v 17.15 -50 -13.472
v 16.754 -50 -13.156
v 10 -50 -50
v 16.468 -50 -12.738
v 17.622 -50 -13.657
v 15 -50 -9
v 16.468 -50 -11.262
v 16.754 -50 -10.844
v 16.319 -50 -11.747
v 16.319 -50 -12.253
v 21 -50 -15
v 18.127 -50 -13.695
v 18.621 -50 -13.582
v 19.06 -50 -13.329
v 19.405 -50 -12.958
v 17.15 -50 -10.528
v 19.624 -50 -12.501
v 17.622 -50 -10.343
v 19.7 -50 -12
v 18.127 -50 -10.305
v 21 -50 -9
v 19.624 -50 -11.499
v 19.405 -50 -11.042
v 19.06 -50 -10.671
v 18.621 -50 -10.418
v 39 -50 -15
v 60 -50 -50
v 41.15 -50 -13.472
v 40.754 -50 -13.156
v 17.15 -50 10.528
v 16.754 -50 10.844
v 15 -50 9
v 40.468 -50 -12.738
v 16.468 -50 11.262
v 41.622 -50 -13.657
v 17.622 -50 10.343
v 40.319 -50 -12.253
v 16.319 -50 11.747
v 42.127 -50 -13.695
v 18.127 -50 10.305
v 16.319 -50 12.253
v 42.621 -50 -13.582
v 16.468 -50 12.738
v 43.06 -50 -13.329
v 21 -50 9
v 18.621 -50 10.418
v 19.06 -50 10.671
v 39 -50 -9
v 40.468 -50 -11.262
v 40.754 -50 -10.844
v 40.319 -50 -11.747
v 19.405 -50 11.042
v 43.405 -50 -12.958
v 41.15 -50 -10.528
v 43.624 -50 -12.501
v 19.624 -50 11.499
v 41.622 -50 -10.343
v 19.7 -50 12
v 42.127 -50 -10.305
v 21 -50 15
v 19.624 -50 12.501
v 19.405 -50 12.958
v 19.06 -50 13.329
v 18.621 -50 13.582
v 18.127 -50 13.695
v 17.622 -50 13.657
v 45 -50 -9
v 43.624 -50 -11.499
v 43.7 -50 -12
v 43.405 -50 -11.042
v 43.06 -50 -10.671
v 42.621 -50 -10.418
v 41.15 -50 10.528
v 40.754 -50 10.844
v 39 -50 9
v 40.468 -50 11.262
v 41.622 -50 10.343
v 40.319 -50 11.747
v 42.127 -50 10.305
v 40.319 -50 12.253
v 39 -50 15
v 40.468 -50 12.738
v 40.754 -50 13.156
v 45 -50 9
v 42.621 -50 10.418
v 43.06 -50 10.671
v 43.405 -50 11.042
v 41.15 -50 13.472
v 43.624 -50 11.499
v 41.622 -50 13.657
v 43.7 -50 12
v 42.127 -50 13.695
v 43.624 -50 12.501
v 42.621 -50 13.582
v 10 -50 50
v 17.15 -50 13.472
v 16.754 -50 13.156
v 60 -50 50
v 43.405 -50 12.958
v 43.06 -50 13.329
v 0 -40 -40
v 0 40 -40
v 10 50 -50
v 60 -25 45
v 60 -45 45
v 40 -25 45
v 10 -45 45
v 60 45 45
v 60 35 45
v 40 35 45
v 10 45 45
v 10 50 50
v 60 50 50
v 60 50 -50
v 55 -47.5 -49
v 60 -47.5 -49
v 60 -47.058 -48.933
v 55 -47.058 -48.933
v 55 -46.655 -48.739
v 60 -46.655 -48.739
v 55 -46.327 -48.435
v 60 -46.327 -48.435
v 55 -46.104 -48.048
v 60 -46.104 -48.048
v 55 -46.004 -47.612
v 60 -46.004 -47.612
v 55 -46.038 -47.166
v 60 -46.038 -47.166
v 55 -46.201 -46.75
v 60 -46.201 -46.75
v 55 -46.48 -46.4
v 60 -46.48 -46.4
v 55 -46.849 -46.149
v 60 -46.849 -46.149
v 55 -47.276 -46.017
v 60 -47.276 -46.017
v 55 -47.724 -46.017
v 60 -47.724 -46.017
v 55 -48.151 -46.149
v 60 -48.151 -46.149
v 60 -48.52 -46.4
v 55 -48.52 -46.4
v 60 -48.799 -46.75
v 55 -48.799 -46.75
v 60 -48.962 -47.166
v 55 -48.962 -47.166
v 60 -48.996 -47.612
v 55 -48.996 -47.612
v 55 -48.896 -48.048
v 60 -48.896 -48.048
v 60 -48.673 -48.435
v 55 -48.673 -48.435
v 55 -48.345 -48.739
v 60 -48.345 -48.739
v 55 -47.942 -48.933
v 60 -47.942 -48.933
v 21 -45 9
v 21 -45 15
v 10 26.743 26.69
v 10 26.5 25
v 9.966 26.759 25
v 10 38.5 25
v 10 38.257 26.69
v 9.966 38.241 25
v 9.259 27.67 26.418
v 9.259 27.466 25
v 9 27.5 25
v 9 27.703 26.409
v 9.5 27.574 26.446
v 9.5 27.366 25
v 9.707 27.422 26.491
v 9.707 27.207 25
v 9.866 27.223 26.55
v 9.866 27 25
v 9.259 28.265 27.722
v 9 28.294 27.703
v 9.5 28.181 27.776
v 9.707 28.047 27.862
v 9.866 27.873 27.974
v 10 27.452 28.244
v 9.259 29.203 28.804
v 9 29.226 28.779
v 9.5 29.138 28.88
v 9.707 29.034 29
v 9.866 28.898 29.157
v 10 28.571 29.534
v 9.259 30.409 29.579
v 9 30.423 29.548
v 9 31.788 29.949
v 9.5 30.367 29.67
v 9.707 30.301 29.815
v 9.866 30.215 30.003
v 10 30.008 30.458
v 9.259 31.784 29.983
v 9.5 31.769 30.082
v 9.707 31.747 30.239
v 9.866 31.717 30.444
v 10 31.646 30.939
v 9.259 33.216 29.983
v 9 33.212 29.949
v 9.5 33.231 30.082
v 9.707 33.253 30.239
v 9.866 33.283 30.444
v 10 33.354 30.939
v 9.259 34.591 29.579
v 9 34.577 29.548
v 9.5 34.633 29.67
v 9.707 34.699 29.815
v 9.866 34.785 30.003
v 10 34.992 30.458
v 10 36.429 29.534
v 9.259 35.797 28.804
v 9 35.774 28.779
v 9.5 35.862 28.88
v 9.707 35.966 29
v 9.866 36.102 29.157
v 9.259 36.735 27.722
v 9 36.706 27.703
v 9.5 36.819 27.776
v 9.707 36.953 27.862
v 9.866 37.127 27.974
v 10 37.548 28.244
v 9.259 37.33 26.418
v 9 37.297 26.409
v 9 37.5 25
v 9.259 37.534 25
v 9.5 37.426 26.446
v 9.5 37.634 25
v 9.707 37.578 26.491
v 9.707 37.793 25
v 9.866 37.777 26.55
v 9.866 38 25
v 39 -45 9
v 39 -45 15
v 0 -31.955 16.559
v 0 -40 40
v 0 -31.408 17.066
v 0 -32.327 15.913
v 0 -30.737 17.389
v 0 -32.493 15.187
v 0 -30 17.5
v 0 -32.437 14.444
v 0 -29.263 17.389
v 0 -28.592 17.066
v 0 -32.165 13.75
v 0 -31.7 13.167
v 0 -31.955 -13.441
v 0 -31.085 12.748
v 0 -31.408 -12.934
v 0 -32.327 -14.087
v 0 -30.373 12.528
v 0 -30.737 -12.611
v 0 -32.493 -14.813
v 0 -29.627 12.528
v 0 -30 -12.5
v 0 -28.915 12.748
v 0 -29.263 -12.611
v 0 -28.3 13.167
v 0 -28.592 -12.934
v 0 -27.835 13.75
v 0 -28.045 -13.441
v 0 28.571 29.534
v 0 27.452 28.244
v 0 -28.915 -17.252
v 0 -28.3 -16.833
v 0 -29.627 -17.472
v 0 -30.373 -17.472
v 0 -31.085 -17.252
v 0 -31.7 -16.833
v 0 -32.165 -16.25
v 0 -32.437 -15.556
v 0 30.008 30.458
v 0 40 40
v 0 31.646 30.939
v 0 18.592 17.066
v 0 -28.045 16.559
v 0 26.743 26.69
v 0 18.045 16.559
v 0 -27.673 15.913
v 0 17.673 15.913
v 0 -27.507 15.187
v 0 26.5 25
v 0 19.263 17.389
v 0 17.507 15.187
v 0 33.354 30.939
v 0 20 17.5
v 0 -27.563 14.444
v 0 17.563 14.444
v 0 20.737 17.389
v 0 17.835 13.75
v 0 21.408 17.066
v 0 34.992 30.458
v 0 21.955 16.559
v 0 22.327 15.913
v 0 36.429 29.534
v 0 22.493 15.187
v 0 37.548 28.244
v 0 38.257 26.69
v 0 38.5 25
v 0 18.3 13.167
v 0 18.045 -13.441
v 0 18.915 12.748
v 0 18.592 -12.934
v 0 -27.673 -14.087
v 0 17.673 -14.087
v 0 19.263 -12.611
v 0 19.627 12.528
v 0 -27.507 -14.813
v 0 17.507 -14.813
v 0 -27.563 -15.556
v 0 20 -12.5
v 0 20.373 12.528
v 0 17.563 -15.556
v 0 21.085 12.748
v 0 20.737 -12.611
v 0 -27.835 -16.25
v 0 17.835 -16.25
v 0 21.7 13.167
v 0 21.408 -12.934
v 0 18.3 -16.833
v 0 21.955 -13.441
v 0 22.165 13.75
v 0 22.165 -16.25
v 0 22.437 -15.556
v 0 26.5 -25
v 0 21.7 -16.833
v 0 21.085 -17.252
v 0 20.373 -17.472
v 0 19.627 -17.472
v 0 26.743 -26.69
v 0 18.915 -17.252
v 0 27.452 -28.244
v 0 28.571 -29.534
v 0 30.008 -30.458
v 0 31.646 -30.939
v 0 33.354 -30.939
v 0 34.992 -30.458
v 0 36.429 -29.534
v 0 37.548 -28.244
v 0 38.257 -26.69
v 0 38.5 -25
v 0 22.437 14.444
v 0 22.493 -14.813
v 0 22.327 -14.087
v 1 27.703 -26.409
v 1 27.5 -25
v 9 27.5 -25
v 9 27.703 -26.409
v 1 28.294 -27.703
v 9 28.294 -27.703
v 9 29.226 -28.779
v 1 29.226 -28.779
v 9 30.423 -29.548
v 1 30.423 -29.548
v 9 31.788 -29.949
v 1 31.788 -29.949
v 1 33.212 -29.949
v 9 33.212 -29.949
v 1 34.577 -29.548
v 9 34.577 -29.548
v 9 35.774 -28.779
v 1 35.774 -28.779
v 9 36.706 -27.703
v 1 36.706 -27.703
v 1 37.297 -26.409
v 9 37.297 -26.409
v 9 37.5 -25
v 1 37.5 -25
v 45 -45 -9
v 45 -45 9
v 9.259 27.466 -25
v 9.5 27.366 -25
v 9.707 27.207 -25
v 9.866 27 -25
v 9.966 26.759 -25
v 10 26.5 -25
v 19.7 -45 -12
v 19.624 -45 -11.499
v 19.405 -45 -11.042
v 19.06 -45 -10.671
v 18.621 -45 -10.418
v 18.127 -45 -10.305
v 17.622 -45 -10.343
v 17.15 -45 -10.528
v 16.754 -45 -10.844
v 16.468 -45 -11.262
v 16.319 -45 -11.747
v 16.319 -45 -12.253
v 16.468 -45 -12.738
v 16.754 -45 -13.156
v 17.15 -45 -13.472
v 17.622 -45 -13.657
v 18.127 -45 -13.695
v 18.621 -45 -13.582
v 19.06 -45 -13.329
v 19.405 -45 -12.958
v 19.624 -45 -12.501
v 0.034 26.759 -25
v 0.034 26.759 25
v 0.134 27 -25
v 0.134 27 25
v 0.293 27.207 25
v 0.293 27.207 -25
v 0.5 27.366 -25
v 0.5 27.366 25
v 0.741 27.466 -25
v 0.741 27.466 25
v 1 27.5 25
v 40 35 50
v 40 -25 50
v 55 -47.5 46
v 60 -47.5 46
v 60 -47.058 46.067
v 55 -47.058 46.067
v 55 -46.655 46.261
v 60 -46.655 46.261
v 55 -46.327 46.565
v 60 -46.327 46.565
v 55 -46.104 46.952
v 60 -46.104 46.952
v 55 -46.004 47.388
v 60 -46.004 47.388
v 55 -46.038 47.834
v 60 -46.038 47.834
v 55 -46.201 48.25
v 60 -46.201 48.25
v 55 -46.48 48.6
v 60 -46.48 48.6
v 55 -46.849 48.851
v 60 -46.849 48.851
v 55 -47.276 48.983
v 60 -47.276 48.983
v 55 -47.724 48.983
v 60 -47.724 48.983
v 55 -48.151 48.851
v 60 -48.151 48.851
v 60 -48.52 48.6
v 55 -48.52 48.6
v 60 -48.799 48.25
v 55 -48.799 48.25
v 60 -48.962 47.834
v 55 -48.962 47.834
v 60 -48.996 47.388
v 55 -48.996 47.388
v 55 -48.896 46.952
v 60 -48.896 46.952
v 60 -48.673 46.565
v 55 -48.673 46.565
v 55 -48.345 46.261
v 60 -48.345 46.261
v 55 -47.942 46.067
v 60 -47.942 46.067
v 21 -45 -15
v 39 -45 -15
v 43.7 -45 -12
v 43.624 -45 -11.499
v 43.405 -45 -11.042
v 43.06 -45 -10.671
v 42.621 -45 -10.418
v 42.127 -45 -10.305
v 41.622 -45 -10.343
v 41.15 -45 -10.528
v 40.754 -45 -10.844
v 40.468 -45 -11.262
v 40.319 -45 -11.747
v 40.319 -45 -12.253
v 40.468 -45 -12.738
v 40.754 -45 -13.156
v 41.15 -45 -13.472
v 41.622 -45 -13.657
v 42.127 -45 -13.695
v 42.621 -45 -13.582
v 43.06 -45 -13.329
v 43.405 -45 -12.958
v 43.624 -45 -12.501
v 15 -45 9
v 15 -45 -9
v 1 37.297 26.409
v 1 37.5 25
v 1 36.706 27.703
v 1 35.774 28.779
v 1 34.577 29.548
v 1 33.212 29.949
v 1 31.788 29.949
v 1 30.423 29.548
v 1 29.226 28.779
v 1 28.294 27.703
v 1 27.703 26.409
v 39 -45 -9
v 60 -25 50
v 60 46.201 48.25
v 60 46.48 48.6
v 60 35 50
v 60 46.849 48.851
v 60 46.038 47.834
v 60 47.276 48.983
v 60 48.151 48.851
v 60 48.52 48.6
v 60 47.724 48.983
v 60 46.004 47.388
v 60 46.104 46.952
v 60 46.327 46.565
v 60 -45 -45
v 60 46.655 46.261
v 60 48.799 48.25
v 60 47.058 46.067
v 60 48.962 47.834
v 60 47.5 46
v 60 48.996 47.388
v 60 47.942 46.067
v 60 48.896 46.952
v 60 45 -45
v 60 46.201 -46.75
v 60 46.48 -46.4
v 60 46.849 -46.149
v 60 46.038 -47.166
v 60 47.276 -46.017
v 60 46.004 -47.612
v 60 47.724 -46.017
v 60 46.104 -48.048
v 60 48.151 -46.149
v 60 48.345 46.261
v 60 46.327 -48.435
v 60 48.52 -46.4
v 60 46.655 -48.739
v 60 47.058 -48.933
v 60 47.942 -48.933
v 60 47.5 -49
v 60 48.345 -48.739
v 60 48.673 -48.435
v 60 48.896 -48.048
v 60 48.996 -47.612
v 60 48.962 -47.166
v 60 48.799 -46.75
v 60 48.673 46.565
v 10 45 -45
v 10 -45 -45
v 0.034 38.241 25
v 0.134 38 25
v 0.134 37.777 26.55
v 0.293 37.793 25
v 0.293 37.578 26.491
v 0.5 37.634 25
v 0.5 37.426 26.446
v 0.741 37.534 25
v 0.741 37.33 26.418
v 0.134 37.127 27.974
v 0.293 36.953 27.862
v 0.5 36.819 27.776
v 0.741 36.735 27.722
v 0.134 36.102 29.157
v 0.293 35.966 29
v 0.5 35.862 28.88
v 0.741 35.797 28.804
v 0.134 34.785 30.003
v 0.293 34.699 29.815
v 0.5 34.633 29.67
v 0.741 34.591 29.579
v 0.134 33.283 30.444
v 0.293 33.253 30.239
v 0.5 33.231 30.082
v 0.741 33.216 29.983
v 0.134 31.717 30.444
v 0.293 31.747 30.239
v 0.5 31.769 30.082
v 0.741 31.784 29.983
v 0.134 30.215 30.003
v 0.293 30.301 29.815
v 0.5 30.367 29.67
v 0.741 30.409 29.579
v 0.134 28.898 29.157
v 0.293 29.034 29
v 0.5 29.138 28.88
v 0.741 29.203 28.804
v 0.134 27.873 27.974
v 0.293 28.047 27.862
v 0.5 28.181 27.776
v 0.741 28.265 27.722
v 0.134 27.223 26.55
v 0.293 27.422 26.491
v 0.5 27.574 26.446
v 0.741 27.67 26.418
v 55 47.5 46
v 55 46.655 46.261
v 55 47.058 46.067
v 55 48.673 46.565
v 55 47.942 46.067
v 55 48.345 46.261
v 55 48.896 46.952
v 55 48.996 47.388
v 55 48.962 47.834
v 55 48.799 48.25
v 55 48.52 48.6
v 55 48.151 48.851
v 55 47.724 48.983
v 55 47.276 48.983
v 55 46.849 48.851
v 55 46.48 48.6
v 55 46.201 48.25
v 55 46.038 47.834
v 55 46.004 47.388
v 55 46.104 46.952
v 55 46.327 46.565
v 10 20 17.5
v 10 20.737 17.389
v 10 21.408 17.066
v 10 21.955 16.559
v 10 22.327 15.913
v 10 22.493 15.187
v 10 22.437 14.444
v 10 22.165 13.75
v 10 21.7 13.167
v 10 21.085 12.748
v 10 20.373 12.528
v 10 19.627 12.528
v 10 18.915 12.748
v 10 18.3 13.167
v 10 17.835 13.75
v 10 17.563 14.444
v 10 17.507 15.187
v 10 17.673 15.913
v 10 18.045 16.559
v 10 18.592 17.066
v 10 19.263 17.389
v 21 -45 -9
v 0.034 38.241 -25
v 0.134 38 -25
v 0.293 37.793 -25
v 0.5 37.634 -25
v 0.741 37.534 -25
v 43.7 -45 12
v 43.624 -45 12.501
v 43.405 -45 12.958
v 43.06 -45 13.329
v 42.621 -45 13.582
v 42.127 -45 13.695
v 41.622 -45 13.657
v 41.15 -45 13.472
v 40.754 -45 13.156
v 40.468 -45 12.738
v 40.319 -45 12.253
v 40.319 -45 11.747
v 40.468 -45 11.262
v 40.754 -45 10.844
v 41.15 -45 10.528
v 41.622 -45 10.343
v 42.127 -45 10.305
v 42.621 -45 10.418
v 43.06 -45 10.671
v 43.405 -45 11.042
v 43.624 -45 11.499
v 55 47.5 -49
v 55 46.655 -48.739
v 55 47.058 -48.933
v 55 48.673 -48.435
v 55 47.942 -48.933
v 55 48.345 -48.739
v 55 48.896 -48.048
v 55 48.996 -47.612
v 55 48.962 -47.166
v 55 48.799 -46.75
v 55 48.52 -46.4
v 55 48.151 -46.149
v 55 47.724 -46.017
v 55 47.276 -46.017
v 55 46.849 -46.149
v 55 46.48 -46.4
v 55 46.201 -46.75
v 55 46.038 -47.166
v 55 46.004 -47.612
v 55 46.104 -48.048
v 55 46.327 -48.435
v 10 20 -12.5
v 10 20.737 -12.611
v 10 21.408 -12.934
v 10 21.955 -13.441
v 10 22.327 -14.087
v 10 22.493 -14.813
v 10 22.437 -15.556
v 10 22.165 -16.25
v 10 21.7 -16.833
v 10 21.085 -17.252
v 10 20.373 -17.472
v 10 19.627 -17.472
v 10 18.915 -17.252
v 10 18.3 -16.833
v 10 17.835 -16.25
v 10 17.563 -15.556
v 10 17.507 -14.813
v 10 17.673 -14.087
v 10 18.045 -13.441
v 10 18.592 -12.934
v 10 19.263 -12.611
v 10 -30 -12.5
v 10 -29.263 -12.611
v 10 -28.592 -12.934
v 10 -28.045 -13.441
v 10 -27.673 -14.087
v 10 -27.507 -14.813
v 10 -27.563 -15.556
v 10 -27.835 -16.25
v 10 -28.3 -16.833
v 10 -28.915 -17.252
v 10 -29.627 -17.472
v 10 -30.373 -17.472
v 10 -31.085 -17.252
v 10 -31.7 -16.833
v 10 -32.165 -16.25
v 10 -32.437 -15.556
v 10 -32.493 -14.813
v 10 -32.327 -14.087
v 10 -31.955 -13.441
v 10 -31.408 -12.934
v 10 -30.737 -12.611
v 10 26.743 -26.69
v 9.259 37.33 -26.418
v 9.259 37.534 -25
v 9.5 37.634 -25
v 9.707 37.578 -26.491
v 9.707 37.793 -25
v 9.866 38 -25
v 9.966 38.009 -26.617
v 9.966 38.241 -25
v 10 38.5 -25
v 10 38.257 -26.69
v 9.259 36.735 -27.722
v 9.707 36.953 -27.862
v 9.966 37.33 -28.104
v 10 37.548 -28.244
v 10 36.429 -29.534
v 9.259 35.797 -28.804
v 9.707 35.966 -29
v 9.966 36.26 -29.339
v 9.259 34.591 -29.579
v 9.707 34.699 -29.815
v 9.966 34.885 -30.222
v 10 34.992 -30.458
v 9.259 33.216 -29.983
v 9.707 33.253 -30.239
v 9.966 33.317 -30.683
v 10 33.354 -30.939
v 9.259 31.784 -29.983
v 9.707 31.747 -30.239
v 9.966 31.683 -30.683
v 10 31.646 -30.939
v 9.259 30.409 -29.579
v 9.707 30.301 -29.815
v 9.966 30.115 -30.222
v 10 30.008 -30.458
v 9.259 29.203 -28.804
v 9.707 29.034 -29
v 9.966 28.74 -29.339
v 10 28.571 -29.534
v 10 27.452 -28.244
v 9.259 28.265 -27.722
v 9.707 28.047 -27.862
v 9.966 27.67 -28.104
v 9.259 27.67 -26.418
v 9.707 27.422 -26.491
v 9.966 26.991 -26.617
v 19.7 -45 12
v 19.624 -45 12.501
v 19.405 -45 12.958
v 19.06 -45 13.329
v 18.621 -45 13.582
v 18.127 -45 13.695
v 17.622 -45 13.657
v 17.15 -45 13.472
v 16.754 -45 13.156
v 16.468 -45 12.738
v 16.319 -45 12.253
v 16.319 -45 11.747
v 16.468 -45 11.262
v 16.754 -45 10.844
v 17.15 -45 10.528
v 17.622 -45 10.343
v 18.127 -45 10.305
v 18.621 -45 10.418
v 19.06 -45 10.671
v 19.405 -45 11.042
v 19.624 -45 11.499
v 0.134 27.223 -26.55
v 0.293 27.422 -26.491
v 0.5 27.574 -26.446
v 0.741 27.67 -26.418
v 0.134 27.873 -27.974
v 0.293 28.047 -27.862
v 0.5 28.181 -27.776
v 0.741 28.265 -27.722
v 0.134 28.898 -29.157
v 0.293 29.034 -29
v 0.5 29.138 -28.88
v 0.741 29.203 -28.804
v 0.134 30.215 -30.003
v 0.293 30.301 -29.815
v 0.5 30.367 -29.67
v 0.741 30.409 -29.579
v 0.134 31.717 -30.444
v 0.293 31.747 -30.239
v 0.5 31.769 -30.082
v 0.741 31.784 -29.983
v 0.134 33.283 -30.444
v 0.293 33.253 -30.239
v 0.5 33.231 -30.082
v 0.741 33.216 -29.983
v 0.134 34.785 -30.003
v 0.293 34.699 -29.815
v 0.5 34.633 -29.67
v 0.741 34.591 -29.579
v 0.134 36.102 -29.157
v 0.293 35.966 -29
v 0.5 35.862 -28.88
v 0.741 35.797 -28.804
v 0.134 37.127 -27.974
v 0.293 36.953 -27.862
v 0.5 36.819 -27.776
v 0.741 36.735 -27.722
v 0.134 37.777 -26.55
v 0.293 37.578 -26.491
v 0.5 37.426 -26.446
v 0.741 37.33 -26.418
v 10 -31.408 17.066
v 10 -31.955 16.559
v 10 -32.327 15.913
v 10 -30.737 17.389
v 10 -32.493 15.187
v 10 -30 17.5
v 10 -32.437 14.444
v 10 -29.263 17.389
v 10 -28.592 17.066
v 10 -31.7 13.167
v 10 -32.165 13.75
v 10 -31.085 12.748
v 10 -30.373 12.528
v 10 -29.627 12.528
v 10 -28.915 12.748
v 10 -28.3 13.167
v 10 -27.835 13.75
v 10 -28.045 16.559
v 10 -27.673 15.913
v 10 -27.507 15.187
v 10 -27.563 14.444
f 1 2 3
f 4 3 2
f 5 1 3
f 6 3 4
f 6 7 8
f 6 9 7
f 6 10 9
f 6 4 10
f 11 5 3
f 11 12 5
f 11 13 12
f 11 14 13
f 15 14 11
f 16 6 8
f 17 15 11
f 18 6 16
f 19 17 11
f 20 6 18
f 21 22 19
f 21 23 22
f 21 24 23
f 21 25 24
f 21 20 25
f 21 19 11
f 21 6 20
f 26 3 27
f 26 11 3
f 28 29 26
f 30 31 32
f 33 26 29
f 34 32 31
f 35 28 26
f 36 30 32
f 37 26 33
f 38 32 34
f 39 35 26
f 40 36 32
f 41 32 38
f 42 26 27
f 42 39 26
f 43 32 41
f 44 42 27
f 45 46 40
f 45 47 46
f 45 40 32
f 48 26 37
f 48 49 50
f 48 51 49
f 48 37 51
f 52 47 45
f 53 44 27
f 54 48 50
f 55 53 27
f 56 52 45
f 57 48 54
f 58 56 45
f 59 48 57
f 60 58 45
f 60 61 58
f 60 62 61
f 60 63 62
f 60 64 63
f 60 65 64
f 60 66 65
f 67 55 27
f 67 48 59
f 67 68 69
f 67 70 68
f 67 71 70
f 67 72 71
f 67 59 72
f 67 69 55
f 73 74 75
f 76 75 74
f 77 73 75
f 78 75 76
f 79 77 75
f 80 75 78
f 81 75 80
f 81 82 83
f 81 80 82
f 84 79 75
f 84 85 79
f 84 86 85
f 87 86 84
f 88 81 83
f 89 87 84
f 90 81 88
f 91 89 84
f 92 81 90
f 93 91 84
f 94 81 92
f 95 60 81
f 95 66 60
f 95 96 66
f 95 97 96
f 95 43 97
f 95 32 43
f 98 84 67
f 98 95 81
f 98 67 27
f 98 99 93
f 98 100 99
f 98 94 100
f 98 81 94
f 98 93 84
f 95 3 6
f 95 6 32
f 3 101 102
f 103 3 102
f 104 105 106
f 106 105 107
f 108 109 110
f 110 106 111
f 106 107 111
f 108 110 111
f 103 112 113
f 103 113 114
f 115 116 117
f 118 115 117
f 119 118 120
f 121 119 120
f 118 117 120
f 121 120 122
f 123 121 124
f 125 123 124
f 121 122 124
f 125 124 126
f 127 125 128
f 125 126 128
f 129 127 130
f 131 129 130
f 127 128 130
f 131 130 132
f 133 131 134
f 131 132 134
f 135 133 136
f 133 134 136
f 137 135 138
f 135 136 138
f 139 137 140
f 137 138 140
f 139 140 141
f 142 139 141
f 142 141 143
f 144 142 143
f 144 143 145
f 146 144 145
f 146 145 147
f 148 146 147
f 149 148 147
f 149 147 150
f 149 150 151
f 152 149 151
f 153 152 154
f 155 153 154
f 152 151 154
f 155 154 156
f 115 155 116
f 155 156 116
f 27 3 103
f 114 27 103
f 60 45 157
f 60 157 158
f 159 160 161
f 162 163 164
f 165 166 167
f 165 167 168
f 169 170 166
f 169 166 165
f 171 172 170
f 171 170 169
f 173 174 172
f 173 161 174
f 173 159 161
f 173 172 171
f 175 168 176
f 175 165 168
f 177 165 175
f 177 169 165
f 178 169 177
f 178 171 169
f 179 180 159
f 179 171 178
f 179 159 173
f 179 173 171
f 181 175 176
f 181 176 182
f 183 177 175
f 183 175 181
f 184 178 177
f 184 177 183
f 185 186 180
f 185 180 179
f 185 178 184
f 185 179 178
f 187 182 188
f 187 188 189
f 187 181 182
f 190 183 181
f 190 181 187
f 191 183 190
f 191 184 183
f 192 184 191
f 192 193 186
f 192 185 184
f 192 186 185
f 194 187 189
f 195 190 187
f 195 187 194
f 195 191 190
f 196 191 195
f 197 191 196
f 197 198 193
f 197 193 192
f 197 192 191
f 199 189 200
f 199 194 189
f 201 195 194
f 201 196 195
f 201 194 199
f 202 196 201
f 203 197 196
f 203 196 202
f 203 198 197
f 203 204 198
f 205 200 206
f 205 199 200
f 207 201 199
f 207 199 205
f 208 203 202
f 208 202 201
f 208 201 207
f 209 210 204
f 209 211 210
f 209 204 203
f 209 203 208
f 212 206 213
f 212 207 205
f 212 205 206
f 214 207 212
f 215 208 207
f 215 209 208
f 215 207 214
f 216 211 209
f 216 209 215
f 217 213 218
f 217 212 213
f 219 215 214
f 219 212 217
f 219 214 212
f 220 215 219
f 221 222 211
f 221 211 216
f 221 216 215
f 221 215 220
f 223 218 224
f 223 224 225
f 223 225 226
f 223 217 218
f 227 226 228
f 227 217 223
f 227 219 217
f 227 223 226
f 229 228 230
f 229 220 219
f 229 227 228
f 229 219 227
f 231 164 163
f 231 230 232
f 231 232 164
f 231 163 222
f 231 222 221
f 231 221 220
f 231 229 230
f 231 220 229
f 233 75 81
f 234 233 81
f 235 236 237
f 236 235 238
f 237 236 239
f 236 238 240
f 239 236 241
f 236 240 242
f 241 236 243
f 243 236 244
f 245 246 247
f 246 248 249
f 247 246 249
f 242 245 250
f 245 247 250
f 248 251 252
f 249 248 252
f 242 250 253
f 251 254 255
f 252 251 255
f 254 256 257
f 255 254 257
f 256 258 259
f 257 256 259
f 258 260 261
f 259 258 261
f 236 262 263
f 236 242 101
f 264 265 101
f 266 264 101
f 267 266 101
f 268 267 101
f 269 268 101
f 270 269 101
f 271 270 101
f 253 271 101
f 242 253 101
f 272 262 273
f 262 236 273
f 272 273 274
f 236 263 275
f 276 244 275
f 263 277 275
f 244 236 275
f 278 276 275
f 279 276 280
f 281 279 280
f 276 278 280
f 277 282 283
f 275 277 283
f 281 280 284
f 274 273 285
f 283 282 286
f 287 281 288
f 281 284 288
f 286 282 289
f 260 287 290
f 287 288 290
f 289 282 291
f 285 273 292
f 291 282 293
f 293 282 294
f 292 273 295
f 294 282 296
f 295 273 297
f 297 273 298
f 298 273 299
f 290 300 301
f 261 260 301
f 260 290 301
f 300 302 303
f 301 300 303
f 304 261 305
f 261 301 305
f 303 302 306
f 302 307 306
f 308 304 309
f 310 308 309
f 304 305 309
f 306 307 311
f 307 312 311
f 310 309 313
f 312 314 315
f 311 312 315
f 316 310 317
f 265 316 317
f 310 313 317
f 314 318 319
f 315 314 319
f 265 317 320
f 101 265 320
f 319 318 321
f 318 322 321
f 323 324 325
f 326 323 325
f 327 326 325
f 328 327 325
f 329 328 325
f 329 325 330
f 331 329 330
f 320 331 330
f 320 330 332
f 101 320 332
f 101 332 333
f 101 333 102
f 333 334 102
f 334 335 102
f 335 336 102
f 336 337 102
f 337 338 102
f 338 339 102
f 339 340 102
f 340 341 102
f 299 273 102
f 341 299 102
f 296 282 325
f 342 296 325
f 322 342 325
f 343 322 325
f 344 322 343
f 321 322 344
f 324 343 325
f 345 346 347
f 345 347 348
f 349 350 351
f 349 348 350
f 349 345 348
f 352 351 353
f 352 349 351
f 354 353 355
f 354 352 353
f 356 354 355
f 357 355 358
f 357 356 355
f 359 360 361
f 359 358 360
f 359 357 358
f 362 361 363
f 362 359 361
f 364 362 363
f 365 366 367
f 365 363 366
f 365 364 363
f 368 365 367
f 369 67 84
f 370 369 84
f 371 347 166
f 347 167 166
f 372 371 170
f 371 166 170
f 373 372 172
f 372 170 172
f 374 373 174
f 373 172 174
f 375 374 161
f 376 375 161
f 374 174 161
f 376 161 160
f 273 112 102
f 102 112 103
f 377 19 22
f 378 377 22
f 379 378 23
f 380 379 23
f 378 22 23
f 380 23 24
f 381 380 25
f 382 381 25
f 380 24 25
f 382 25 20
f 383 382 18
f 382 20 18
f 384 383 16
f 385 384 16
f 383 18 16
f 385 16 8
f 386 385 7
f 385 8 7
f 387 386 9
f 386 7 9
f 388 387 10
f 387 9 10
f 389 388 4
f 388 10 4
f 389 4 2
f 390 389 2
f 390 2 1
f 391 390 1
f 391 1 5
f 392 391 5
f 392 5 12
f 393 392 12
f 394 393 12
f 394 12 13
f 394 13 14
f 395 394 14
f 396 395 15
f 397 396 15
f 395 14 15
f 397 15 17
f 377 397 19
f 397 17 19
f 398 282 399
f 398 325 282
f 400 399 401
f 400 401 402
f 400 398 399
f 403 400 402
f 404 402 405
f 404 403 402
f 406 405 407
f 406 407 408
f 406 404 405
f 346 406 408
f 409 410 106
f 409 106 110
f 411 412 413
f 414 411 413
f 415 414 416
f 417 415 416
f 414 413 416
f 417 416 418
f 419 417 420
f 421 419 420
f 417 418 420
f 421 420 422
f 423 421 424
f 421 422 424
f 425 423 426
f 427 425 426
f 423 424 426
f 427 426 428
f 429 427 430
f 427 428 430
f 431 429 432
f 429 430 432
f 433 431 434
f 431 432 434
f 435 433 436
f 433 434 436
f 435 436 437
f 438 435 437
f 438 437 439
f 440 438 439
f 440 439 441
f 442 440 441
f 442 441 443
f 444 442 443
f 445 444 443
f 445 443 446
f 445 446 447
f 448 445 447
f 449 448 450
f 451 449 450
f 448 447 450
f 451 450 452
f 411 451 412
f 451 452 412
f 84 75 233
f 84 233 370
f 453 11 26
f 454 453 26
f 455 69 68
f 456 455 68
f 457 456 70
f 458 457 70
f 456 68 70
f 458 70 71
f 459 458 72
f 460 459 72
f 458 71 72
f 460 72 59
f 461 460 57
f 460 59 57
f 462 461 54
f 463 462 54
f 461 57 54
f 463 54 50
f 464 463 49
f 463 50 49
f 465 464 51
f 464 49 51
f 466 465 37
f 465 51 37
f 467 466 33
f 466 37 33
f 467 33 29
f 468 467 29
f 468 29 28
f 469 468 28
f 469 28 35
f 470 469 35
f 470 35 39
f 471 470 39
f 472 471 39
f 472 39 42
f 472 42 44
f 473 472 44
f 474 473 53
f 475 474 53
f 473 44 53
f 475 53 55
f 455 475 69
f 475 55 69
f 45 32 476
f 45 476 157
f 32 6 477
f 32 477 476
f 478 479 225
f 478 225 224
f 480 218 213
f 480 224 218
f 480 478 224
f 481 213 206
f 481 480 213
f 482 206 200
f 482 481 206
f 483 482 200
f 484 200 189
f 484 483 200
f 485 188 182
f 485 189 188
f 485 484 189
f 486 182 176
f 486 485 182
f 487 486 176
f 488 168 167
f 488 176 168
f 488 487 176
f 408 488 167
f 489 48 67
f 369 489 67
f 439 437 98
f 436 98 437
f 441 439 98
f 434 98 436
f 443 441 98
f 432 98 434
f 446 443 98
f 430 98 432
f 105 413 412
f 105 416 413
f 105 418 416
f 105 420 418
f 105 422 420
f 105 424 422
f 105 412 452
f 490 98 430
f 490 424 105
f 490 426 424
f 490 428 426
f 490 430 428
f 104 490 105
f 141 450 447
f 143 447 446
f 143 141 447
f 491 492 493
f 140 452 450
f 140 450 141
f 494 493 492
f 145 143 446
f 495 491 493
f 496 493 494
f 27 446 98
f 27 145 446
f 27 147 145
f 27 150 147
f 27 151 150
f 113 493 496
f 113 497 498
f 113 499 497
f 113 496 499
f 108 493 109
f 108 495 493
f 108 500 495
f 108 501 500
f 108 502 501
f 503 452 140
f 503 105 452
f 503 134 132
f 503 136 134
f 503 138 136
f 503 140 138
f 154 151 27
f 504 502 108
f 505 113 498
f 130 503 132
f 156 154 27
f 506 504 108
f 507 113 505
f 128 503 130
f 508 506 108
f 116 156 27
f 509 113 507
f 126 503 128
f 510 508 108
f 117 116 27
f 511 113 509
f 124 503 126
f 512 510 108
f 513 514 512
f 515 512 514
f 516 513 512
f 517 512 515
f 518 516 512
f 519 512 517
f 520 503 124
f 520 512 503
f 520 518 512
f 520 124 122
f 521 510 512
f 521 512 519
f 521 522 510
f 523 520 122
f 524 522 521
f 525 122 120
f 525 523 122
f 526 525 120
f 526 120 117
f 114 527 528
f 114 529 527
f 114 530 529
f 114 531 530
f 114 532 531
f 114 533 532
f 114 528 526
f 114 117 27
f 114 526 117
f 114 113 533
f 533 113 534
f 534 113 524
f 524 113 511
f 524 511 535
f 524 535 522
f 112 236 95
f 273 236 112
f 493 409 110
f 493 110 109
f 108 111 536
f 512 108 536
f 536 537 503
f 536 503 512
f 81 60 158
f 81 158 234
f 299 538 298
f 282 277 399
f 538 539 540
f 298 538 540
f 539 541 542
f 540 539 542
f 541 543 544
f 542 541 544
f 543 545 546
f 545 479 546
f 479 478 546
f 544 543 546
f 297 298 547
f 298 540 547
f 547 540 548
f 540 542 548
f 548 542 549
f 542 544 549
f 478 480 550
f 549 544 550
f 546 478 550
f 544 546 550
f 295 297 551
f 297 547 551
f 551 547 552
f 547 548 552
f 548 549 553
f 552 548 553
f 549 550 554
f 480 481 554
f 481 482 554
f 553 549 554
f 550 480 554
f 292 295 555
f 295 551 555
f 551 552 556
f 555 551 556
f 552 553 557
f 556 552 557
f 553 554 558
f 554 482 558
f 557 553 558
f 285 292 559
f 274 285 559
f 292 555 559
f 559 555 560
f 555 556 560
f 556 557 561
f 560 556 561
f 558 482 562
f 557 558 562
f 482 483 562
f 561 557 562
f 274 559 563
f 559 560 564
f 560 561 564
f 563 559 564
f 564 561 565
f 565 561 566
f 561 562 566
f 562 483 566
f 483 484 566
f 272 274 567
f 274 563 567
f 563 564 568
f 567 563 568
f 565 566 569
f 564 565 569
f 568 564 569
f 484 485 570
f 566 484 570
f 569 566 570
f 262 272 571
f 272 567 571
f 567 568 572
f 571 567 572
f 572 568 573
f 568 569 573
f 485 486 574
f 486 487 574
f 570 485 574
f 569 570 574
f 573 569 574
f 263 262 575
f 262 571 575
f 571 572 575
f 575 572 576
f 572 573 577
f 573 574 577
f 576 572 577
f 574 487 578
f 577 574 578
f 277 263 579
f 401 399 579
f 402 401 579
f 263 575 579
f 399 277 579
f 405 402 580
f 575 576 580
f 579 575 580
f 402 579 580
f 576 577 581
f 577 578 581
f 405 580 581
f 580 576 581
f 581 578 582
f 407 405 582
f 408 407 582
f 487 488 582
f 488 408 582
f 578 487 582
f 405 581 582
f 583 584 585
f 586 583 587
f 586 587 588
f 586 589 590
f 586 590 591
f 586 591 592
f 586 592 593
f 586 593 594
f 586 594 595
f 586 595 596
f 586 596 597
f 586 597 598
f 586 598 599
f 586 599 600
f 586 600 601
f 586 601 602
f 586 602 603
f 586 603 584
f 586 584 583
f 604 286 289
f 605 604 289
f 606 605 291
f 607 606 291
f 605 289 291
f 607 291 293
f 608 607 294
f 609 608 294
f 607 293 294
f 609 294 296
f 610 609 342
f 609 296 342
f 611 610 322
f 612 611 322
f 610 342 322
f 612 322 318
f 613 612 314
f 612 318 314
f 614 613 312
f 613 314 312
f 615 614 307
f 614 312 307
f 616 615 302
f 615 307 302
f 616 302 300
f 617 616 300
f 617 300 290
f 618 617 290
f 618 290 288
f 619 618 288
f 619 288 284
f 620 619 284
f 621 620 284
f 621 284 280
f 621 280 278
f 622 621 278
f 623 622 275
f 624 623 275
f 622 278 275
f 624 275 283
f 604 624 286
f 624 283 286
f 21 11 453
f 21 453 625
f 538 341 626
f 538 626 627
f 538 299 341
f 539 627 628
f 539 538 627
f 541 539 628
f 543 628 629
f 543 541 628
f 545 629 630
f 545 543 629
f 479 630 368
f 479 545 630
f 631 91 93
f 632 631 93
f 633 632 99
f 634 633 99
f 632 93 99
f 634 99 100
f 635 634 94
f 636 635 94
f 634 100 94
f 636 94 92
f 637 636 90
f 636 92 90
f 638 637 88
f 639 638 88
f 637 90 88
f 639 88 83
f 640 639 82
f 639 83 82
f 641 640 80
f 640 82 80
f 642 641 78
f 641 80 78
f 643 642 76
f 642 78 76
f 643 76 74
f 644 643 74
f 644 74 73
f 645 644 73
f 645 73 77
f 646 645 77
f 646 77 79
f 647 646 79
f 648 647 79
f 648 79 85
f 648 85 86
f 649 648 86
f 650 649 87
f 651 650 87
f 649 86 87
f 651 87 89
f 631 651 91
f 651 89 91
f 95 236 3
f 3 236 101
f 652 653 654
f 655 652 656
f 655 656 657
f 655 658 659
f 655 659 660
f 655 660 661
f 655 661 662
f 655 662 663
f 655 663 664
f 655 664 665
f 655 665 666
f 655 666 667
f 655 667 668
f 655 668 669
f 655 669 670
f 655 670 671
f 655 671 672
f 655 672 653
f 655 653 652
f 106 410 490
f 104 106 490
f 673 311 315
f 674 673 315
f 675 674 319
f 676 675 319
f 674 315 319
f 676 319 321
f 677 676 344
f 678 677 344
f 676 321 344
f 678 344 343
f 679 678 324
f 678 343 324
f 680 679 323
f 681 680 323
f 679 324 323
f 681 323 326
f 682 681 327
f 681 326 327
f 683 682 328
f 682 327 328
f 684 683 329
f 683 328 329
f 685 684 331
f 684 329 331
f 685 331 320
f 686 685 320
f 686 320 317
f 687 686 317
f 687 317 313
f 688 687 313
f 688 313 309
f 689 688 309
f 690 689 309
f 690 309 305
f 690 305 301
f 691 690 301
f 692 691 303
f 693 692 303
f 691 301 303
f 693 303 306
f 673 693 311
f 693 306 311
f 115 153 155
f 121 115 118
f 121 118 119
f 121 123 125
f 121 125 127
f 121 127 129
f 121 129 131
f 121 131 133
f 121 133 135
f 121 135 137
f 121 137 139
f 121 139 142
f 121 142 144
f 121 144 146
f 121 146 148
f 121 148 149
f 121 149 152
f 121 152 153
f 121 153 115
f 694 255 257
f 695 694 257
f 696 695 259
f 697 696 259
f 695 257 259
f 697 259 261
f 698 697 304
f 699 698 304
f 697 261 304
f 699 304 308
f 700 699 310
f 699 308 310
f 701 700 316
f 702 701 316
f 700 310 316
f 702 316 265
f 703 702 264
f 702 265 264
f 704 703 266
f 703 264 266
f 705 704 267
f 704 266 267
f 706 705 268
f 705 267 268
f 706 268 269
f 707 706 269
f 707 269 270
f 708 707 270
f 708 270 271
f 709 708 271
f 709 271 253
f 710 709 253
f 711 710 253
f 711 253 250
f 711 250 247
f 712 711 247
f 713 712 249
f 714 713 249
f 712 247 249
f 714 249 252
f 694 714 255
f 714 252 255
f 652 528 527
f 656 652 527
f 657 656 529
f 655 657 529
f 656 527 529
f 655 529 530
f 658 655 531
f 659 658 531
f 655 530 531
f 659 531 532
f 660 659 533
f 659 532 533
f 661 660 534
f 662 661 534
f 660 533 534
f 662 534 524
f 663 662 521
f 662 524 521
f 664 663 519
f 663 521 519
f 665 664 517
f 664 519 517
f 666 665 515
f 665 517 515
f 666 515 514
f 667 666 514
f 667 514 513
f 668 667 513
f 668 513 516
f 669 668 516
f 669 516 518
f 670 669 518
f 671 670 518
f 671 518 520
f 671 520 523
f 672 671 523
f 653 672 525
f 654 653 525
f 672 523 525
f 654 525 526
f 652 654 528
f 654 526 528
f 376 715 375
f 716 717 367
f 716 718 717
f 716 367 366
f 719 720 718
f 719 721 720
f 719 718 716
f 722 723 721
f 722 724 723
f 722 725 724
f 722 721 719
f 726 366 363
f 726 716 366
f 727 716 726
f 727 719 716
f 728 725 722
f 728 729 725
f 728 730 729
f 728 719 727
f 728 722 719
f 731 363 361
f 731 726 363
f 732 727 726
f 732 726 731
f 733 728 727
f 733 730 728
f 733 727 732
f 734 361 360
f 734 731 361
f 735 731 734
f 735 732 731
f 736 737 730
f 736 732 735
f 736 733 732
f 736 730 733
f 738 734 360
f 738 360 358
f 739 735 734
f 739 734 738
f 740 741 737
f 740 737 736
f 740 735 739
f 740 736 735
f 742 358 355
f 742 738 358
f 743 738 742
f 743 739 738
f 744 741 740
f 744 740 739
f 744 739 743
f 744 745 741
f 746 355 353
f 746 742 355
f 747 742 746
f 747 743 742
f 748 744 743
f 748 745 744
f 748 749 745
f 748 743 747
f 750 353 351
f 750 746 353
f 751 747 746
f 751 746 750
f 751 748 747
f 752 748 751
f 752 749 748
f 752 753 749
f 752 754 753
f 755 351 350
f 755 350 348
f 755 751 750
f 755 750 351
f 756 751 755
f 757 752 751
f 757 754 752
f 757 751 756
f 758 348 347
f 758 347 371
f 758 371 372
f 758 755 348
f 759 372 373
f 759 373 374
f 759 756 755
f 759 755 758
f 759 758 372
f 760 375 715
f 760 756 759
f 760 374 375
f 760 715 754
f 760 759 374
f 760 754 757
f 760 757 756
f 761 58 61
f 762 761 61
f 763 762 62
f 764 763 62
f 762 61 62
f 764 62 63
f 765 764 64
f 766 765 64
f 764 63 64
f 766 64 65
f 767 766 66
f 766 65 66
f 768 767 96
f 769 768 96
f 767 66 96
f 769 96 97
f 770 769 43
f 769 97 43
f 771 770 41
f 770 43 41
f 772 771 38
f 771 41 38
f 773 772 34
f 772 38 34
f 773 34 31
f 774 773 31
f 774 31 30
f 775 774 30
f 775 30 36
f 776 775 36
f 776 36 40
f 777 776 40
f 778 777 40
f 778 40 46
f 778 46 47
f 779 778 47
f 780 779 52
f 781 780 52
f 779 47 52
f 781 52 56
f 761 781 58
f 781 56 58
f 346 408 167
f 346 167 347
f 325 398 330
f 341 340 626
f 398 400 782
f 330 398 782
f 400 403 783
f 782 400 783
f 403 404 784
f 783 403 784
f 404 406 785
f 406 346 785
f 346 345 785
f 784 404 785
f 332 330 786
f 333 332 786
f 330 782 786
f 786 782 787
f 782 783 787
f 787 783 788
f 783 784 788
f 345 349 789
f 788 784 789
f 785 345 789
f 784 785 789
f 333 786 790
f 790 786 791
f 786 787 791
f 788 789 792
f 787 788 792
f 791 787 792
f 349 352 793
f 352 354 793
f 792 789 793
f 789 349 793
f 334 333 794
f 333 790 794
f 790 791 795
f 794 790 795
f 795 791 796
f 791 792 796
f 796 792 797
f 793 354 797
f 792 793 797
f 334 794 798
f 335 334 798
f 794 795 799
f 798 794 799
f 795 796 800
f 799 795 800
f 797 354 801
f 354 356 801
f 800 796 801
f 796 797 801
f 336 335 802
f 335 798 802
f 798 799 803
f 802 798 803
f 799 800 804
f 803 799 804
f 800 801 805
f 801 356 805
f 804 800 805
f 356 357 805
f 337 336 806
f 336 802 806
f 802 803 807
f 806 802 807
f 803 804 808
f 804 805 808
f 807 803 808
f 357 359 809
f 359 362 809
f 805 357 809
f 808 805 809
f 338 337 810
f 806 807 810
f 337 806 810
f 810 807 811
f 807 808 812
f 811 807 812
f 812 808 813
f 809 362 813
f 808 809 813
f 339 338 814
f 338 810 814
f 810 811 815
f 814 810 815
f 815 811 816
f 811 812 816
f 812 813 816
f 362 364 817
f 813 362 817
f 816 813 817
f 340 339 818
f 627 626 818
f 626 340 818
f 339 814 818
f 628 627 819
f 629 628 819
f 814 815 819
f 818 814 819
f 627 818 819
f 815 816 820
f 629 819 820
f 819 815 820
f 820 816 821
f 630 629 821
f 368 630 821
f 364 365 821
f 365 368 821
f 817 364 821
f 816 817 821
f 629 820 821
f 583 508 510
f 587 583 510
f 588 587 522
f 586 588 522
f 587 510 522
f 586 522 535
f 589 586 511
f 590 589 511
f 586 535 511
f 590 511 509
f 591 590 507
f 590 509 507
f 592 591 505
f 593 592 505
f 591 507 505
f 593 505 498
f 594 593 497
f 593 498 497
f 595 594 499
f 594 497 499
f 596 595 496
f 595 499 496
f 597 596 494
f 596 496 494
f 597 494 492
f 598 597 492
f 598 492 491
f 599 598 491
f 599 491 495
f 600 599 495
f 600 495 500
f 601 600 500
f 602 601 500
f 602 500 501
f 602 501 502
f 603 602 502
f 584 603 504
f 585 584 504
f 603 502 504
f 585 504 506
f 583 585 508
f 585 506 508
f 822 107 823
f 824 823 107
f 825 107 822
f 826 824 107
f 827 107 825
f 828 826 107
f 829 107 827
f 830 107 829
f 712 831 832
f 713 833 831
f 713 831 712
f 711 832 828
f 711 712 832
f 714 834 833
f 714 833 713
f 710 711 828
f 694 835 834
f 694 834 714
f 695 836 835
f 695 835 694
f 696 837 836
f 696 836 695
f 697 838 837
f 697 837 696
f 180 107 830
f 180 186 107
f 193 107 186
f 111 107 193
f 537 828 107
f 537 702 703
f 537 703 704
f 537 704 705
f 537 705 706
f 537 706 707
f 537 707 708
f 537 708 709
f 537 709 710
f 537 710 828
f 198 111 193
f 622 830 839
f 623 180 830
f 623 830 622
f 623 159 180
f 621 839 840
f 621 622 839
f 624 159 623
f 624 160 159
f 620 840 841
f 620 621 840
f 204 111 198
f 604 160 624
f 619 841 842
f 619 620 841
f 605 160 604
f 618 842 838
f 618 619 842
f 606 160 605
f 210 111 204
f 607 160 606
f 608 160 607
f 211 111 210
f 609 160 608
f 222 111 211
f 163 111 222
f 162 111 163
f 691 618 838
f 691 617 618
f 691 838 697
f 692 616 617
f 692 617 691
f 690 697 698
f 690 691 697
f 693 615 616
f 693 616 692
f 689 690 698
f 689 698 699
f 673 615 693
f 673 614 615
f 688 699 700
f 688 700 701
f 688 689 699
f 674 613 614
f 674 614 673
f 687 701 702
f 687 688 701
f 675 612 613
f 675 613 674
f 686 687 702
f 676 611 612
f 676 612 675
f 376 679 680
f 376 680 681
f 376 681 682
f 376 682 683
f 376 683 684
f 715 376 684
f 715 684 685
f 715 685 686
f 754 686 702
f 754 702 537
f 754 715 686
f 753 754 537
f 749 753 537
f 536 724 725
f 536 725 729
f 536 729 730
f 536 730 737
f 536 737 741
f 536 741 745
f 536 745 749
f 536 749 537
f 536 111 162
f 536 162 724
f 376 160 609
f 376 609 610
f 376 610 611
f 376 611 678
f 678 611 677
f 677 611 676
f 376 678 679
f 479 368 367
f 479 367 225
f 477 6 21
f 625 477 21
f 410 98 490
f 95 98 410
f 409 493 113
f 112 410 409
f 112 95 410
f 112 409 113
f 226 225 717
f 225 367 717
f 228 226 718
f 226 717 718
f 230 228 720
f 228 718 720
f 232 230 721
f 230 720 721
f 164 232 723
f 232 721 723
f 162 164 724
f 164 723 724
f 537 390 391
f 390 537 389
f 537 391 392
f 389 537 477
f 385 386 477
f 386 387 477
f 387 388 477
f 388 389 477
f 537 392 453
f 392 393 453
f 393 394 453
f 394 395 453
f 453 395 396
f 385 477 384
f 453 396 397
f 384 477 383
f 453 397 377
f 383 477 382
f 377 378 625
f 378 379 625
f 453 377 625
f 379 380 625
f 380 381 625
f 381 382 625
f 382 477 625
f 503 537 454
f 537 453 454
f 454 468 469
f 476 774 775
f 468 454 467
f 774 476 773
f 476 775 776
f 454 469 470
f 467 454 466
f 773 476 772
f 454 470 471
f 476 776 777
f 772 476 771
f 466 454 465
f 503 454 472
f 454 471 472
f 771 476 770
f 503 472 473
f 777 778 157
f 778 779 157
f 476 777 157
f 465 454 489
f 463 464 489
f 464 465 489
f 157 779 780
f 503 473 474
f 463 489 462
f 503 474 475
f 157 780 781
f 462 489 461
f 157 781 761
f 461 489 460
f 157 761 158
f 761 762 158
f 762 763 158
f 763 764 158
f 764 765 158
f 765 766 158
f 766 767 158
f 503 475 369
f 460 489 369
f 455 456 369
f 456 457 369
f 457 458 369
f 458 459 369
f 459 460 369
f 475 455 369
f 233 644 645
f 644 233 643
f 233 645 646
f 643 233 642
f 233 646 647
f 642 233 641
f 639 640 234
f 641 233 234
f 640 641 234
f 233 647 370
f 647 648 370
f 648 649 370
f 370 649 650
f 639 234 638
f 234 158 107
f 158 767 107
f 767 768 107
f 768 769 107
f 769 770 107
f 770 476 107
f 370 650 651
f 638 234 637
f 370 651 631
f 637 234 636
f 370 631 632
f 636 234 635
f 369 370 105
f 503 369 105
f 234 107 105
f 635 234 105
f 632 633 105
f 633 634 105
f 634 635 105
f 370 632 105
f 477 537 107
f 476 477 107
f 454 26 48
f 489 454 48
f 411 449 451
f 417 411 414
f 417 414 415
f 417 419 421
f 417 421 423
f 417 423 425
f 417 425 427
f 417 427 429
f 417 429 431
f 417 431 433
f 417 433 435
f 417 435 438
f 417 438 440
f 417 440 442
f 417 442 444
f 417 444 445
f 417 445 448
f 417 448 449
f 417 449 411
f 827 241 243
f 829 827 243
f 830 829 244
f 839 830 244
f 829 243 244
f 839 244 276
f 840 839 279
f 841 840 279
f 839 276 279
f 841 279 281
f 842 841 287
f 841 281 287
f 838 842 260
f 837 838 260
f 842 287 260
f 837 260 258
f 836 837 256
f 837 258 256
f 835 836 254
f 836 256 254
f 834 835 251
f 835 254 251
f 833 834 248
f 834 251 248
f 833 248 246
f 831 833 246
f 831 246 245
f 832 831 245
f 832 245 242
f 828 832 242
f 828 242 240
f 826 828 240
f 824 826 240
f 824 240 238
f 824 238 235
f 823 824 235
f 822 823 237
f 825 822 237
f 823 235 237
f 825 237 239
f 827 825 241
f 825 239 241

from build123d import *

# Parameters (mm, degrees)
SKETCH7_W            = 100
SKETCH7_H            = 100
BOSS_EXTRUDE2_DEPTH  = 10
SKETCH8_W            = 100
SKETCH8_H            = 100
SKETCH8_W_2          = 90
SKETCH8_H_2          = 90
BOSS_EXTRUDE3_DEPTH  = 50
CHAMFER1_SIZE        = 10
CUT_EXTRUDE5_DEPTH   = 15
FILLET3_R            = 1
SKETCH16_W           = 30
SKETCH16_H           = 30
CUT_EXTRUDE6_DEPTH   = 10
SKETCH17_W           = 6
SKETCH17_H           = 6
SKETCH17_R           = 1.7
BOSS_EXTRUDE4_DEPTH  = 5
LPATTERN2_COUNT      = 2
LPATTERN2_PITCH      = 24
LPATTERN2_COUNT_DIR2 = 2
LPATTERN2_PITCH_DIR2 = 24
SKETCH18_R           = 2.5
CUT_EXTRUDE7_DEPTH   = 10
LPATTERN3_COUNT      = 2
LPATTERN3_PITCH      = 30
LPATTERN3_COUNT_DIR2 = 2
LPATTERN3_PITCH_DIR2 = 50
SKETCH19_W           = 20
SKETCH19_H           = 60
CUT_EXTRUDE8_DEPTH   = 10
SKETCH20_R           = 1.5
CUT_EXTRUDE9_DEPTH   = 5
LPATTERN4_COUNT      = 2
LPATTERN4_PITCH      = 95
LPATTERN4_COUNT_DIR2 = 2
LPATTERN4_PITCH_DIR2 = 95


with BuildPart() as part:
    # Sketch7 → Boss-Extrude2 (new body)
    with BuildSketch(Plane(origin=(0, 0, 0), x_dir=(0, 0, -1), z_dir=(1, 0, 0))):
        Rectangle(SKETCH7_W, SKETCH7_H)
    extrude(amount=BOSS_EXTRUDE2_DEPTH)

    # Sketch8 → Boss-Extrude3 (add)
    with BuildSketch(Plane(origin=(10, 0, 0), x_dir=(0, 0, -1), z_dir=(1, 0, 0))):
        Rectangle(SKETCH8_W, SKETCH8_H)
        Rectangle(SKETCH8_W_2, SKETCH8_H_2, mode=Mode.SUBTRACT)
    extrude(amount=BOSS_EXTRUDE3_DEPTH)

    # Chamfer1
    chamfer1_edges = [part.edges().sort_by_distance(p)[0] for p in [
        (0, 50, 0),
        (0, 0, -50),
        (0, -50, 0),
        (0, 0, 50),
    ]]
    chamfer(chamfer1_edges, length=CHAMFER1_SIZE)

    # Sketch14 → Cut-Extrude5 (cut)
    with BuildSketch(Plane.ZY):
        with BuildLine():
            Line((-25, 37.5), (25, 37.5))
            ThreePointArc((25, 37.5), (30, 32.5), (25, 27.5))
            Line((25, 27.5), (-25, 27.5))
            ThreePointArc((-25, 27.5), (-30, 32.5), (-25, 37.5))
        make_face()
    extrude(amount=-CUT_EXTRUDE5_DEPTH, mode=Mode.SUBTRACT)

    # Fillet3
    fillet3_edges = [part.edges().sort_by_distance(p)[0] for p in [
        (10, 27.5, 0),
        (10, 32.5, 30),
        (10, 37.5, 0),
        (10, 32.5, -30),
        (0, 32.5, -30),
        (0, 27.5, 0),
        (0, 32.5, 30),
        (0, 37.5, 0),
    ]]
    fillet(fillet3_edges, radius=FILLET3_R)

    # Sketch16 → Cut-Extrude6 (cut)
    with BuildSketch(Plane.XZ.offset(50)):
        with Locations((30, 0)):
            Rectangle(SKETCH16_W, SKETCH16_H)
    extrude(amount=-CUT_EXTRUDE6_DEPTH, mode=Mode.SUBTRACT)

    # Sketch17 → Boss-Extrude4 (add)
    with BuildSketch(Plane.XZ.offset(50)):
        with Locations((18, 12)):
            Rectangle(SKETCH17_W, SKETCH17_H)
        with Locations((18, 12)):
            Circle(SKETCH17_R, mode=Mode.SUBTRACT)
    boss_extrude4 = extrude(amount=-BOSS_EXTRUDE4_DEPTH)

    # LPattern2: Boss-Extrude4 2 × 2
    with Locations(*[(i * LPATTERN2_PITCH, 0, -j * LPATTERN2_PITCH_DIR2) for i in range(LPATTERN2_COUNT) for j in range(LPATTERN2_COUNT_DIR2) if (i, j) != (0, 0)]):
        add(boss_extrude4)

    # Sketch18 → Cut-Extrude7 (cut)
    with BuildSketch(Plane.ZY):
        with Locations((-15, 20)):
            Circle(SKETCH18_R)
    cut_extrude7 = extrude(amount=-CUT_EXTRUDE7_DEPTH, mode=Mode.SUBTRACT)

    # LPattern3: Cut-Extrude7 2 × 2
    with Locations(*[(0, -j * LPATTERN3_PITCH_DIR2, i * LPATTERN3_PITCH) for i in range(LPATTERN3_COUNT) for j in range(LPATTERN3_COUNT_DIR2) if (i, j) != (0, 0)]):
        add(cut_extrude7, mode=Mode.SUBTRACT)

    # Sketch19 → Cut-Extrude8 (cut)
    with BuildSketch(Plane.XY.offset(50)):
        with Locations((50, 5)):
            Rectangle(SKETCH19_W, SKETCH19_H)
    extrude(amount=-CUT_EXTRUDE8_DEPTH, mode=Mode.SUBTRACT)

    # Sketch20 → Cut-Extrude9 (cut)
    with BuildSketch(Plane(origin=(60, 0, 0), x_dir=(0, 0, -1), z_dir=(1, 0, 0))):
        with Locations((-47.5, 47.5)):
            Circle(SKETCH20_R)
    cut_extrude9 = extrude(amount=-CUT_EXTRUDE9_DEPTH, mode=Mode.SUBTRACT)

    # LPattern4: Cut-Extrude9 2 × 2
    with Locations(*[(0, -j * LPATTERN4_PITCH_DIR2, -i * LPATTERN4_PITCH) for i in range(LPATTERN4_COUNT) for j in range(LPATTERN4_COUNT_DIR2) if (i, j) != (0, 0)]):
        add(cut_extrude9, mode=Mode.SUBTRACT)


solid = part.part
